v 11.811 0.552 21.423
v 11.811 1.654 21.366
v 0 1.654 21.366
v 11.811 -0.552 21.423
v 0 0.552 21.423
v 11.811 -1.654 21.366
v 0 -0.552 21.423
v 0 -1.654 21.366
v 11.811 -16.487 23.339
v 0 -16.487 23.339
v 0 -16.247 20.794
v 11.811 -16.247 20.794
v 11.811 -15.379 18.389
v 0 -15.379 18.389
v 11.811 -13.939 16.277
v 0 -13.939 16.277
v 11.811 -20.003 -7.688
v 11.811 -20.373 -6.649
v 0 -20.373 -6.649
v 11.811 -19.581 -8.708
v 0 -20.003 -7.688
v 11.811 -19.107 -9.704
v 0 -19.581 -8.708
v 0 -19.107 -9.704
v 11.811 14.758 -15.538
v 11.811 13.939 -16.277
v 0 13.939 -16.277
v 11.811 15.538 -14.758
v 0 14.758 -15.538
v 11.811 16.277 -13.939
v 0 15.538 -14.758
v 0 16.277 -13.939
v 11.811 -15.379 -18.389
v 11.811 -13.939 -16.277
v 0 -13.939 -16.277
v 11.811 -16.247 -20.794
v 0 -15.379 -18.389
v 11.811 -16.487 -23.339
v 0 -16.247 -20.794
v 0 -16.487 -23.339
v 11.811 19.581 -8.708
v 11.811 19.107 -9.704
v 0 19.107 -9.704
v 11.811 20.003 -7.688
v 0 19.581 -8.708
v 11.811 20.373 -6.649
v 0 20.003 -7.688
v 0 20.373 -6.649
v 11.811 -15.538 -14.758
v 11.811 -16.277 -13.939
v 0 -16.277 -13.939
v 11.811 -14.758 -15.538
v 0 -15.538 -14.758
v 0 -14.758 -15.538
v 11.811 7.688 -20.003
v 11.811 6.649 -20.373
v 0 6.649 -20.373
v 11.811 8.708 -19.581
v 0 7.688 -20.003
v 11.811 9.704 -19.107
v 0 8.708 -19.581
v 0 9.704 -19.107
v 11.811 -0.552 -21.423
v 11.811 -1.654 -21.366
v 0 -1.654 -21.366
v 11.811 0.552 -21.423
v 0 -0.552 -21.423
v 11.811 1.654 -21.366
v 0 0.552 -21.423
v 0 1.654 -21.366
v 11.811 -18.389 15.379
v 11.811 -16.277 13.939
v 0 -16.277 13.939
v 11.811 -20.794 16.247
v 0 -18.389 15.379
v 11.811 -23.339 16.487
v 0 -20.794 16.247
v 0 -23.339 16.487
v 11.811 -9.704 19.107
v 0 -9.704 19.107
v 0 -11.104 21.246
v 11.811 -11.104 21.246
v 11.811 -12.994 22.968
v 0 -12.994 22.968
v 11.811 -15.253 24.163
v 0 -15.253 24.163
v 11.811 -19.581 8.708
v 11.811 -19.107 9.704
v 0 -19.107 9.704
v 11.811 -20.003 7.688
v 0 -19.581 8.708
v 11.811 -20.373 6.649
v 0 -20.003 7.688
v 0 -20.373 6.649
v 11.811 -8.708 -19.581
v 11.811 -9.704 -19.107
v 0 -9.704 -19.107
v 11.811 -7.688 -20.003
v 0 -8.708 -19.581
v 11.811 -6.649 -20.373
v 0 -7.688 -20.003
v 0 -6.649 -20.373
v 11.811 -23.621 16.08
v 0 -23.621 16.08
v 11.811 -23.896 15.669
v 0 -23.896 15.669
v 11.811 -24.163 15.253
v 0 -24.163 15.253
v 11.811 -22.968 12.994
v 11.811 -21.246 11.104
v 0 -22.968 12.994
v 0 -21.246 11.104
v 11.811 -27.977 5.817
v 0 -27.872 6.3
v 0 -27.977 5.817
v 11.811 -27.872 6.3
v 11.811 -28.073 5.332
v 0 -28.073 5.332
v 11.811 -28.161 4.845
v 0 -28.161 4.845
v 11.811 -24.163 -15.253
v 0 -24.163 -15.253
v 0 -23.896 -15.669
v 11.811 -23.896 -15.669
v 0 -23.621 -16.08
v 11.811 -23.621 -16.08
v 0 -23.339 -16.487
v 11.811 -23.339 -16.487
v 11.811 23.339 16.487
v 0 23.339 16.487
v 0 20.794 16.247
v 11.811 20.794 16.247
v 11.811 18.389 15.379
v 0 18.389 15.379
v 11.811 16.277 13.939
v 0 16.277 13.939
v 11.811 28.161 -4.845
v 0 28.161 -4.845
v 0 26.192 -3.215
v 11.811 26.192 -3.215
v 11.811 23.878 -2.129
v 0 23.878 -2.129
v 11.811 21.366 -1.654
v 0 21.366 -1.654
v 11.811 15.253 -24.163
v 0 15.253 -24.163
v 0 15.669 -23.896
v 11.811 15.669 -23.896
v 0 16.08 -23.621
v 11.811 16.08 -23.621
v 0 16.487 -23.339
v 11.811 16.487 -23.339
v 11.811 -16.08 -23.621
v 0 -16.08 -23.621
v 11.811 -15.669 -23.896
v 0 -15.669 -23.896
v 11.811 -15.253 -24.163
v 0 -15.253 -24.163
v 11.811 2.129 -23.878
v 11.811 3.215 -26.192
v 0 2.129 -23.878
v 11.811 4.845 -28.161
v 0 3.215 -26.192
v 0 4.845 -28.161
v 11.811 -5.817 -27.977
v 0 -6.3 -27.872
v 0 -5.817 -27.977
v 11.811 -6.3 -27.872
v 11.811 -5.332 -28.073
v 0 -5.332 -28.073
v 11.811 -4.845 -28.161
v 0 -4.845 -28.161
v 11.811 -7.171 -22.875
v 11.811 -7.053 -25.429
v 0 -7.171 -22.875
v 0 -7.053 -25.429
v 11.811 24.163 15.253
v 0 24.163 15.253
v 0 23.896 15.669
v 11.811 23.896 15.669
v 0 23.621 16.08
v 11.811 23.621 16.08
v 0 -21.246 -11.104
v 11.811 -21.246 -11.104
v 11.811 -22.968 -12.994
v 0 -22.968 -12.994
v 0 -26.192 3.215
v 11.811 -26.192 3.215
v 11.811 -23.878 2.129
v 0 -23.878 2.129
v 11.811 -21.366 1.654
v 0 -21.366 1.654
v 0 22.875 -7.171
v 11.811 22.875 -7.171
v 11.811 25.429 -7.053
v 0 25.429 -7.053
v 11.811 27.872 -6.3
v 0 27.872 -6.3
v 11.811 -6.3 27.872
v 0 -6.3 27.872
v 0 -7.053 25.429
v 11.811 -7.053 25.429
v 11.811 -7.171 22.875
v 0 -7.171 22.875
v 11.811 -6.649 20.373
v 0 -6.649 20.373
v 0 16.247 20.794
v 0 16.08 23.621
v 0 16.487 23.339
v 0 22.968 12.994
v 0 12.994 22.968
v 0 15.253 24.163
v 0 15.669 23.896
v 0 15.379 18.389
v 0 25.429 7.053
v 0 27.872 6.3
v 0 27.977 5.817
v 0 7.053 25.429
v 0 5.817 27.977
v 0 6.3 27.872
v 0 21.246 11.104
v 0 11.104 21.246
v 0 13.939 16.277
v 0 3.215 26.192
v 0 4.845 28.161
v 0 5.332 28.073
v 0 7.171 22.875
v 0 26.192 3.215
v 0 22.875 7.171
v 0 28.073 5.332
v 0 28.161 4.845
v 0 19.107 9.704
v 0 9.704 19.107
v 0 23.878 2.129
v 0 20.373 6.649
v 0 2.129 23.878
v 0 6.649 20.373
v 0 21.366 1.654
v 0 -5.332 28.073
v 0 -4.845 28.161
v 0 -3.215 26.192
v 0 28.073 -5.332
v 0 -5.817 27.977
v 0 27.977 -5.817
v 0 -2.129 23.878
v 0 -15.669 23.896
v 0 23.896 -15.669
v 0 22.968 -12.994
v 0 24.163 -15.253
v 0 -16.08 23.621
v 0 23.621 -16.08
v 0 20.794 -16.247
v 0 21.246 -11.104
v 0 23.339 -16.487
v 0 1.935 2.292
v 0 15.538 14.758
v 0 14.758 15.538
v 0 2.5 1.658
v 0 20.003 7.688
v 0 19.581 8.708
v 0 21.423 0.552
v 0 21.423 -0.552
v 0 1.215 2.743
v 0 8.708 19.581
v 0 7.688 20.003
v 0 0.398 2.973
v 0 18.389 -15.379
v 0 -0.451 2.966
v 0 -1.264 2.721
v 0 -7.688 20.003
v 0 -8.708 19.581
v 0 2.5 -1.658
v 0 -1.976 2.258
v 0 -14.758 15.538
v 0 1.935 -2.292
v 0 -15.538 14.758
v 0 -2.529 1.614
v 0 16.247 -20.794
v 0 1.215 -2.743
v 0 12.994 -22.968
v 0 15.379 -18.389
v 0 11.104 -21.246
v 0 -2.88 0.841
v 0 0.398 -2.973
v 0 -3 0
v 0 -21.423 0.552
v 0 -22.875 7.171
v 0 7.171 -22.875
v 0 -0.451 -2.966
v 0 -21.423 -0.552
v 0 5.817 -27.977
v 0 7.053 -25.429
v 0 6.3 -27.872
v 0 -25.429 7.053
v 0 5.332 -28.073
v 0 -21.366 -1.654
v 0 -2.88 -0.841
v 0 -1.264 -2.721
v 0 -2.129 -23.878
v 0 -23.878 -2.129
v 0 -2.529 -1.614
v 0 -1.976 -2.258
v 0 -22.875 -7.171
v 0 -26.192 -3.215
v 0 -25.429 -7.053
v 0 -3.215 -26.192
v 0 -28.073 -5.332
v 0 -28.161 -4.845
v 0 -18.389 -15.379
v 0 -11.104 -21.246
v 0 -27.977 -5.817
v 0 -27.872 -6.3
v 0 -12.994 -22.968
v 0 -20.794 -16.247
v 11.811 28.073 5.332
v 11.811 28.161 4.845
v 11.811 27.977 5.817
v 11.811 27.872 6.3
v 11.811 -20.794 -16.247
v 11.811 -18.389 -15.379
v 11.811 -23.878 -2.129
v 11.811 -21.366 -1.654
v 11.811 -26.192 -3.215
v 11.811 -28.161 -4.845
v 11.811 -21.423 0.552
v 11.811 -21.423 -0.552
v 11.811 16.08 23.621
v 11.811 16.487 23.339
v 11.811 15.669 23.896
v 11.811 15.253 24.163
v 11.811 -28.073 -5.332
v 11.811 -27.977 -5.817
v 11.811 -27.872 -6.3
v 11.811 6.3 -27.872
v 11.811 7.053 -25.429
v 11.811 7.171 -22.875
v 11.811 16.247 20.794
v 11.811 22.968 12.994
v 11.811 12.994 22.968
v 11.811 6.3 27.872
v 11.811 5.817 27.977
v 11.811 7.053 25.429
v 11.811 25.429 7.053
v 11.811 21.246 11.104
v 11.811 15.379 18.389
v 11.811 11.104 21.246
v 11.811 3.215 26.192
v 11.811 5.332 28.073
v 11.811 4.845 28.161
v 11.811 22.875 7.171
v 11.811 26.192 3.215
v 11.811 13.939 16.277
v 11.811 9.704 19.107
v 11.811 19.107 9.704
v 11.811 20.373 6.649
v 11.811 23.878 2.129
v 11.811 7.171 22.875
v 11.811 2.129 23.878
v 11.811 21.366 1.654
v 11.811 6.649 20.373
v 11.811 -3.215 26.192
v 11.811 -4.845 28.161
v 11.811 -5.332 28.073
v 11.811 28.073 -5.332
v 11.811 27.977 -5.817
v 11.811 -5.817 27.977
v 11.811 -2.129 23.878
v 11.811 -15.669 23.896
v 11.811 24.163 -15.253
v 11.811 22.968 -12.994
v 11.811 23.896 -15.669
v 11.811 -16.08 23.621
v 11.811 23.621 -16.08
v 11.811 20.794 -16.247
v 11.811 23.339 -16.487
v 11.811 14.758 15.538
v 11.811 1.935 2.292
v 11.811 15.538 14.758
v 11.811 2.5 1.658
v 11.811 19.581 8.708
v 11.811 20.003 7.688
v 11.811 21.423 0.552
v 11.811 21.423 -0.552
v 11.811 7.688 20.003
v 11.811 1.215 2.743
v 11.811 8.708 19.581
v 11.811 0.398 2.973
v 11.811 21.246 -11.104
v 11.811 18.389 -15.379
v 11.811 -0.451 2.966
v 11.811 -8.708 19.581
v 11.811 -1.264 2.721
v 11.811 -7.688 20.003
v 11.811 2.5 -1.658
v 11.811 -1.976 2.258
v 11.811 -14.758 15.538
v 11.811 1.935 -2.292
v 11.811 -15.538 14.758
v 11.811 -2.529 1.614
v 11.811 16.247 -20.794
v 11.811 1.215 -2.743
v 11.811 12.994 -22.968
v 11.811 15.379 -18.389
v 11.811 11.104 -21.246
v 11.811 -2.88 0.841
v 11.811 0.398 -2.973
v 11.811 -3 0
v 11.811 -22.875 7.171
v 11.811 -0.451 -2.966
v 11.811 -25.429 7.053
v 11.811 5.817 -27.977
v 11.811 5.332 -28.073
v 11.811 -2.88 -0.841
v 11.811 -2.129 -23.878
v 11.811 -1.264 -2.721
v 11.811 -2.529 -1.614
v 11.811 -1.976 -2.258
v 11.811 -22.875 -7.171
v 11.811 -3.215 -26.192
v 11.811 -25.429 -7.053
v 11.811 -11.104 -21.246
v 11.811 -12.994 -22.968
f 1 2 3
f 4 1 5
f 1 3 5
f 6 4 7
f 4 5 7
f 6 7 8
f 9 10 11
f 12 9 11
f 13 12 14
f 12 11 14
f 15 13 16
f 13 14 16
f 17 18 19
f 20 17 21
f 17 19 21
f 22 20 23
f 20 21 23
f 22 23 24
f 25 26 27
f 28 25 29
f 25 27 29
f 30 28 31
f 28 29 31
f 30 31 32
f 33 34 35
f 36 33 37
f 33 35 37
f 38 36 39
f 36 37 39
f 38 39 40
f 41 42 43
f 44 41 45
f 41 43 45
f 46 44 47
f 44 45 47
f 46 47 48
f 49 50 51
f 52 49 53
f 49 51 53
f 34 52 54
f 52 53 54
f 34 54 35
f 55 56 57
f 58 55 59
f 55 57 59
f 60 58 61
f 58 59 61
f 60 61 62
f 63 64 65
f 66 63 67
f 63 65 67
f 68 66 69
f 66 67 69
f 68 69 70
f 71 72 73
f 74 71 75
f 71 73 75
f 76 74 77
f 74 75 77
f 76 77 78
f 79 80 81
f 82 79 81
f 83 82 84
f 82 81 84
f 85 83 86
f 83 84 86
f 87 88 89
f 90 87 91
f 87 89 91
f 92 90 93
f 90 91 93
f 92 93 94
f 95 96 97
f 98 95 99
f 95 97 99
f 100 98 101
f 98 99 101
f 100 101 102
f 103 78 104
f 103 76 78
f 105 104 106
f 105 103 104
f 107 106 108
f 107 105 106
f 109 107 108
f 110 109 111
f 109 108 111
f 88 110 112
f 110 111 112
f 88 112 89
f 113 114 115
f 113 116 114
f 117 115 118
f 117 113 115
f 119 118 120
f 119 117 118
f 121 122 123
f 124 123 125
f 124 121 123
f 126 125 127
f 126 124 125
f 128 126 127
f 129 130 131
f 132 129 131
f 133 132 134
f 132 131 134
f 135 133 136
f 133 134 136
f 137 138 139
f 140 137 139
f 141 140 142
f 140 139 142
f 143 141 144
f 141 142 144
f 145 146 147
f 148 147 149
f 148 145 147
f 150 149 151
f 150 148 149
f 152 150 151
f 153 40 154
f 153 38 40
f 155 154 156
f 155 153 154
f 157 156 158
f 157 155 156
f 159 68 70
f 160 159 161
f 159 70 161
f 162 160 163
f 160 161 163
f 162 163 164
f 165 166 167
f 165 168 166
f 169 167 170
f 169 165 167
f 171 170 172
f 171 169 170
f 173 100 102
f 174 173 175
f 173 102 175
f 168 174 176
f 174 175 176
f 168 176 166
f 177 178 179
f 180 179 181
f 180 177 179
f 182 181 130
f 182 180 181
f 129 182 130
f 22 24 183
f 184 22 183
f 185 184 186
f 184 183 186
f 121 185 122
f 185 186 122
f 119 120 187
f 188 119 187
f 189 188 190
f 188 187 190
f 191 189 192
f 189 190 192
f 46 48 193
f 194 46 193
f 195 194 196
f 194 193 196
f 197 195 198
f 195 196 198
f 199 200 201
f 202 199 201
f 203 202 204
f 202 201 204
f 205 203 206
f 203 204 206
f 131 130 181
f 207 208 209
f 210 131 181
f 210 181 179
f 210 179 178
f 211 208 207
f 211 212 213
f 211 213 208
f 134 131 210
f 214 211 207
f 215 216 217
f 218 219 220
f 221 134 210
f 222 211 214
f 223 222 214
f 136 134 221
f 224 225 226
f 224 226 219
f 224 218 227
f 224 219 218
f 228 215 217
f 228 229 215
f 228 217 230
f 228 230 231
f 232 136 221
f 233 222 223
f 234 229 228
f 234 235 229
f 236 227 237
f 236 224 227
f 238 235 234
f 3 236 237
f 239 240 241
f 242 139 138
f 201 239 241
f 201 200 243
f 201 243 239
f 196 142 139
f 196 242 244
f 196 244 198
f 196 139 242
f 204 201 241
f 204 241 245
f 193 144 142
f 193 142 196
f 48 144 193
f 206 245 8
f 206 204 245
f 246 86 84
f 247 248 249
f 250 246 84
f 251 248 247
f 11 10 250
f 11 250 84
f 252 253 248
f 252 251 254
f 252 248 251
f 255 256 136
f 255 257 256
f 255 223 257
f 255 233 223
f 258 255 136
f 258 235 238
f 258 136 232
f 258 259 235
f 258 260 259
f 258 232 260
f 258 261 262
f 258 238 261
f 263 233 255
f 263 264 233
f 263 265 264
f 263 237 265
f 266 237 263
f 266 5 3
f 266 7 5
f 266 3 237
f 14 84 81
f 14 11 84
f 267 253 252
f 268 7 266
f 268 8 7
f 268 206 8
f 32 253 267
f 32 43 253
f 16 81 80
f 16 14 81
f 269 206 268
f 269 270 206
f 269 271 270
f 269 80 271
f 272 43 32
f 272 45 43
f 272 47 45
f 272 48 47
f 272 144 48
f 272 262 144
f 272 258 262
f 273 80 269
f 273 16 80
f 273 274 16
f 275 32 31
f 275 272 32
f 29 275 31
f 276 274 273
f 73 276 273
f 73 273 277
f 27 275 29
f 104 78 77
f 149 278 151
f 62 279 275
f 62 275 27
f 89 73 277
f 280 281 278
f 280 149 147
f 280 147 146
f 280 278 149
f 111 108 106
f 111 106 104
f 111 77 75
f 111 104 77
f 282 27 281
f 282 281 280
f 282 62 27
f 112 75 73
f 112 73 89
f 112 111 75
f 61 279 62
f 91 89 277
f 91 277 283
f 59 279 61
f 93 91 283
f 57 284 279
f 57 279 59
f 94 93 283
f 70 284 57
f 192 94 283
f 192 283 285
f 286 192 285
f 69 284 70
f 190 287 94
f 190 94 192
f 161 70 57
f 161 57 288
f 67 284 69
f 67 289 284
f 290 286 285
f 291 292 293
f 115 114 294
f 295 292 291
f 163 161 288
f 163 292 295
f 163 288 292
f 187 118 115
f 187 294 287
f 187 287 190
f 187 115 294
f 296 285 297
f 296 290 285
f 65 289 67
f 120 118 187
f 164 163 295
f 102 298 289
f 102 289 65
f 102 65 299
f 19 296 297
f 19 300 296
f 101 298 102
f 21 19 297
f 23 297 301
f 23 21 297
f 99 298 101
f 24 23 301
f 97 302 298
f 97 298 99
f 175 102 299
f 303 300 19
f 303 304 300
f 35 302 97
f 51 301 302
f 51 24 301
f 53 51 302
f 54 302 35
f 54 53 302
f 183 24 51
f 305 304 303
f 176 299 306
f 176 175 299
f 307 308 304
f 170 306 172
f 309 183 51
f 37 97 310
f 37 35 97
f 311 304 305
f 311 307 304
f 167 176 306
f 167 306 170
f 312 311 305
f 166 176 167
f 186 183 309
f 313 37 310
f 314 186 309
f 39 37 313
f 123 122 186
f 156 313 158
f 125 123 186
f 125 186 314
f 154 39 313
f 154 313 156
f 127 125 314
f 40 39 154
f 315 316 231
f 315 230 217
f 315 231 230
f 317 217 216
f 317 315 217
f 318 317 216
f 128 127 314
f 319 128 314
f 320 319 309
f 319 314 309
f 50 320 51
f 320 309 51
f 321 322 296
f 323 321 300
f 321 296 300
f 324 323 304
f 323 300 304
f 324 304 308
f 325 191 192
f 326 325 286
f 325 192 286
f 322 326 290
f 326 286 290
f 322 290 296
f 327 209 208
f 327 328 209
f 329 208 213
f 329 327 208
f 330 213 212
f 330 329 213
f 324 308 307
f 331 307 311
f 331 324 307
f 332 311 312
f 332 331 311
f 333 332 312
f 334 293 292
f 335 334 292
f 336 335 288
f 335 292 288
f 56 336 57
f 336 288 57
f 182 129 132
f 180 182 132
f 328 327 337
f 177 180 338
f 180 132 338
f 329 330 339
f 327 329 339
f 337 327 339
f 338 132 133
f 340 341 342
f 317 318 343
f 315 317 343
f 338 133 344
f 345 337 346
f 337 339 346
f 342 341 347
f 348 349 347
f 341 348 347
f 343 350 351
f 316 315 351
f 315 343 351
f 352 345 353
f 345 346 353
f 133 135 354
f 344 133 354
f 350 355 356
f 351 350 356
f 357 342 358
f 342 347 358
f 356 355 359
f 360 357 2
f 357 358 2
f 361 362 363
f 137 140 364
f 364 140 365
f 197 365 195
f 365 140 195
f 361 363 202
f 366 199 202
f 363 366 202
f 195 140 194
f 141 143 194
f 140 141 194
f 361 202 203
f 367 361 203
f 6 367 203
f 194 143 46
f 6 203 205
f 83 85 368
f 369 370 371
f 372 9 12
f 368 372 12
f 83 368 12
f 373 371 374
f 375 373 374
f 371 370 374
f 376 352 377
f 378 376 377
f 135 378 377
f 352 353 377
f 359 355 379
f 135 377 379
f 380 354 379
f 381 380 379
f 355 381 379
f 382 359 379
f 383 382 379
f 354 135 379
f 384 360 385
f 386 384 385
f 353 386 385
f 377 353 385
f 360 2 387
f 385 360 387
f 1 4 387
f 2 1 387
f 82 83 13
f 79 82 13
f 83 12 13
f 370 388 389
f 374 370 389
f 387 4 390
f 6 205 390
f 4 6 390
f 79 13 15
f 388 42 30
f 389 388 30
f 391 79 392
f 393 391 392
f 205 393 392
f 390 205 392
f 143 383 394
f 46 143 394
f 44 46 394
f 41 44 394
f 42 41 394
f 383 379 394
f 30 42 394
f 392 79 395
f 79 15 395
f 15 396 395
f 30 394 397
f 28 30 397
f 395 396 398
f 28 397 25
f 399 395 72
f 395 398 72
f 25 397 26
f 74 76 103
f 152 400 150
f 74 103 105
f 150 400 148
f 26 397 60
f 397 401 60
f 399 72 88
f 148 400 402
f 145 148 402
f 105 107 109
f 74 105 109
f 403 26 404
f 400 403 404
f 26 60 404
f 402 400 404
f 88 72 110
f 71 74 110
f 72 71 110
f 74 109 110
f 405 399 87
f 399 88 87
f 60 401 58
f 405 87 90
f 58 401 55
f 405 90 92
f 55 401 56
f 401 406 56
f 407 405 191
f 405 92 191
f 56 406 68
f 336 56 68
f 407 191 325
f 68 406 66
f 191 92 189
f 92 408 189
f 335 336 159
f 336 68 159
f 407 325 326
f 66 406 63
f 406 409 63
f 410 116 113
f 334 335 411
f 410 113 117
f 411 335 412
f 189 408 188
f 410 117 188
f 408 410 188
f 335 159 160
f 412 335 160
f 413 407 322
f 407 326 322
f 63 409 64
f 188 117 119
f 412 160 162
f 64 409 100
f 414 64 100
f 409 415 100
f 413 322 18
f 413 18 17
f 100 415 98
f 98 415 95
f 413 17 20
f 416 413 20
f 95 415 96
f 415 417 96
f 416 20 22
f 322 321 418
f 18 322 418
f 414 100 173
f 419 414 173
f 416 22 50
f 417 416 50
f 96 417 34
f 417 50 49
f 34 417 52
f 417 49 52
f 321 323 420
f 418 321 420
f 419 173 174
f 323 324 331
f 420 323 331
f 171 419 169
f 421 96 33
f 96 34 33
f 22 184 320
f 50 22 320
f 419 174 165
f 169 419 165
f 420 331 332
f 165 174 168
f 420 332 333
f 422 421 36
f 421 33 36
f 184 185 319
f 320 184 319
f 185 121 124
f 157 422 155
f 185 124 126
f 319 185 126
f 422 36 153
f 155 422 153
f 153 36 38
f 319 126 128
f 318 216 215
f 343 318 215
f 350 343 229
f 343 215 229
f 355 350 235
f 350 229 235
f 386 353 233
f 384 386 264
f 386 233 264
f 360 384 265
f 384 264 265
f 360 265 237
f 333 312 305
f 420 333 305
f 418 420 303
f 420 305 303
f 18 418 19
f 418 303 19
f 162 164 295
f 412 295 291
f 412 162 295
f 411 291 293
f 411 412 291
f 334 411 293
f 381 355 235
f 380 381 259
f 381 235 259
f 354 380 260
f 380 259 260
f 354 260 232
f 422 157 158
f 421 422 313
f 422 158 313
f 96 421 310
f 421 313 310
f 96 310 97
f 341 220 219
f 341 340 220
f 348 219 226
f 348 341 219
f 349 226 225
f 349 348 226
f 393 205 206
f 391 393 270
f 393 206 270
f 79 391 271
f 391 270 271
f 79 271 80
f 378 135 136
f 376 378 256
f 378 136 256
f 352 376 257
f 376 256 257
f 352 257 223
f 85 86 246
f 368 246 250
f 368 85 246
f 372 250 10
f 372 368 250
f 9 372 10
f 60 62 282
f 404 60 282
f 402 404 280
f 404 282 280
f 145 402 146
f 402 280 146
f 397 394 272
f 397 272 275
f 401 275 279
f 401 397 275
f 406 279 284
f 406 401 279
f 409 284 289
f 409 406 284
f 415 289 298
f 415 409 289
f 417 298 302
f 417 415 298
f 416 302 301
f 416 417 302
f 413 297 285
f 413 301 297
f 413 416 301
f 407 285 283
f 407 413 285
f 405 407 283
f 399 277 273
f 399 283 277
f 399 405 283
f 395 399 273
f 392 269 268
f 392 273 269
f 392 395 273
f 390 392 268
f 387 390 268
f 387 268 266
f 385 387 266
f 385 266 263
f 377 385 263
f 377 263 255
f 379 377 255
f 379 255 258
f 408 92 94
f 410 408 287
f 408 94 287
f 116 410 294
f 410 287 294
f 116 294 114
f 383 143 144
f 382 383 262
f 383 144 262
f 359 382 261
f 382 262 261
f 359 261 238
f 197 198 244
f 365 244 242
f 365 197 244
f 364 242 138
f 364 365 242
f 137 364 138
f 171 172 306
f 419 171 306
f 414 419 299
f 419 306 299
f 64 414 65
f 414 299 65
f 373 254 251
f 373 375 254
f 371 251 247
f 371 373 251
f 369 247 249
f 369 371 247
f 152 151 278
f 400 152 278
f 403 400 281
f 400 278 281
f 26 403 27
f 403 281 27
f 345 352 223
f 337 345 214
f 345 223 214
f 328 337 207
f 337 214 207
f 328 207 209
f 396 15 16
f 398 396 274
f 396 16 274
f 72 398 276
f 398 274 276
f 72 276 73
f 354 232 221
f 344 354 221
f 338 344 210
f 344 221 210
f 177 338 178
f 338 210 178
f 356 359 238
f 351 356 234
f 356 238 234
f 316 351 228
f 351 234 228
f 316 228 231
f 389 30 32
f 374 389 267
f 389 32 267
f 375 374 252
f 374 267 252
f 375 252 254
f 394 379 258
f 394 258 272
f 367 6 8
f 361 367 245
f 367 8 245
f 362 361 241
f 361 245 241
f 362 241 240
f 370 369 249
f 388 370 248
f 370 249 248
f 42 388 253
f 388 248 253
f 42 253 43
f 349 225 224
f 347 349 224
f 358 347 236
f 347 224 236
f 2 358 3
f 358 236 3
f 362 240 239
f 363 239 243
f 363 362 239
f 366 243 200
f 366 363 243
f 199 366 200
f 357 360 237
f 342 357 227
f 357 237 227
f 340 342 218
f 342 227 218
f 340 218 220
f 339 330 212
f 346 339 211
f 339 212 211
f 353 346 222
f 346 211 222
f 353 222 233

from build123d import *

# Parameters (mm, degrees)
BASPROSKE_W        = 11.811
BASPROSKE_H        = 28.575
TOOTHCUT_DEPTH     = 43.101792967
TEETHCUTS_COUNT    = 16
TEETHCUTS_ANGLE    = 337.5
BORSKE_R           = 0.396875
BORE_DEPTH         = 50.8000508
CUT_EXTRUDE1_DEPTH = 42.540449503


with BuildPart() as part:
    # BasProSke → Base-Revolve (revolve)
    with BuildSketch(Plane(origin=(0, 0, 0), x_dir=(1, 0, 0), z_dir=(0, 1, 0)), mode=Mode.PRIVATE) as base_revolve_sk:
        with Locations((5.9055, 14.2875)):
            Rectangle(BASPROSKE_W, BASPROSKE_H)
    revolve(base_revolve_sk.sketch.rotate(Axis((-10, 0, 0), (1, 0, 0)), 180), axis=Axis((-10, 0, 0), (1, 0, 0)))

    # TooCutSke → ToothCut (cut, through all)
    with BuildSketch(Plane(origin=(0, 0, 0), x_dir=(0, 0, -1), z_dir=(1, 0, 0))):
        with BuildLine():
            ThreePointArc((1.653773222, 21.366073035), (0, 21.42998), (-1.653773222, 21.366073035))
            ThreePointArc((-1.653773222, 21.366073035), (-2.605634946, 25.083646688), (-4.868483936, 28.182986789))
            ThreePointArc((-4.868483936, 28.182986789), (0, 28.6004), (4.868483936, 28.182986789))
            ThreePointArc((4.868483936, 28.182986789), (2.605634946, 25.083646688), (1.653773222, 21.366073035))
        make_face()
    toothcut = extrude(amount=TOOTHCUT_DEPTH, mode=Mode.SUBTRACT)

    # TeethCuts: ToothCut ×16 about axis
    teethcuts_axis = Axis((-10, 0, 0), (1, 0, 0))
    for i in range(1, TEETHCUTS_COUNT):
        add(toothcut.rotate(teethcuts_axis, i * TEETHCUTS_ANGLE / (TEETHCUTS_COUNT - 1)), mode=Mode.SUBTRACT)

    # BorSke → Bore (cut, symmetric)
    with BuildSketch(Plane(origin=(0, 0, 0), x_dir=(0, 0, -1), z_dir=(1, 0, 0))):
        with Locations(Location((0, 0, 0), (0, 0, 180))):
            Circle(BORSKE_R)
    extrude(amount=BORE_DEPTH, both=True, mode=Mode.SUBTRACT)

    # Sketch1 → Cut-Extrude1 (cut, through all)
    with BuildSketch(Plane(origin=(11.811, 0, 0), x_dir=(0, 0, -1), z_dir=(1, 0, 0))):
        with BuildLine():
            Line((-1.658312395, 2.5), (1.658312395, 2.5))
            ThreePointArc((1.658312395, 2.5), (0, -3), (-1.658312395, 2.5))
        make_face()
    extrude(amount=-CUT_EXTRUDE1_DEPTH, mode=Mode.SUBTRACT)


solid = part.part
